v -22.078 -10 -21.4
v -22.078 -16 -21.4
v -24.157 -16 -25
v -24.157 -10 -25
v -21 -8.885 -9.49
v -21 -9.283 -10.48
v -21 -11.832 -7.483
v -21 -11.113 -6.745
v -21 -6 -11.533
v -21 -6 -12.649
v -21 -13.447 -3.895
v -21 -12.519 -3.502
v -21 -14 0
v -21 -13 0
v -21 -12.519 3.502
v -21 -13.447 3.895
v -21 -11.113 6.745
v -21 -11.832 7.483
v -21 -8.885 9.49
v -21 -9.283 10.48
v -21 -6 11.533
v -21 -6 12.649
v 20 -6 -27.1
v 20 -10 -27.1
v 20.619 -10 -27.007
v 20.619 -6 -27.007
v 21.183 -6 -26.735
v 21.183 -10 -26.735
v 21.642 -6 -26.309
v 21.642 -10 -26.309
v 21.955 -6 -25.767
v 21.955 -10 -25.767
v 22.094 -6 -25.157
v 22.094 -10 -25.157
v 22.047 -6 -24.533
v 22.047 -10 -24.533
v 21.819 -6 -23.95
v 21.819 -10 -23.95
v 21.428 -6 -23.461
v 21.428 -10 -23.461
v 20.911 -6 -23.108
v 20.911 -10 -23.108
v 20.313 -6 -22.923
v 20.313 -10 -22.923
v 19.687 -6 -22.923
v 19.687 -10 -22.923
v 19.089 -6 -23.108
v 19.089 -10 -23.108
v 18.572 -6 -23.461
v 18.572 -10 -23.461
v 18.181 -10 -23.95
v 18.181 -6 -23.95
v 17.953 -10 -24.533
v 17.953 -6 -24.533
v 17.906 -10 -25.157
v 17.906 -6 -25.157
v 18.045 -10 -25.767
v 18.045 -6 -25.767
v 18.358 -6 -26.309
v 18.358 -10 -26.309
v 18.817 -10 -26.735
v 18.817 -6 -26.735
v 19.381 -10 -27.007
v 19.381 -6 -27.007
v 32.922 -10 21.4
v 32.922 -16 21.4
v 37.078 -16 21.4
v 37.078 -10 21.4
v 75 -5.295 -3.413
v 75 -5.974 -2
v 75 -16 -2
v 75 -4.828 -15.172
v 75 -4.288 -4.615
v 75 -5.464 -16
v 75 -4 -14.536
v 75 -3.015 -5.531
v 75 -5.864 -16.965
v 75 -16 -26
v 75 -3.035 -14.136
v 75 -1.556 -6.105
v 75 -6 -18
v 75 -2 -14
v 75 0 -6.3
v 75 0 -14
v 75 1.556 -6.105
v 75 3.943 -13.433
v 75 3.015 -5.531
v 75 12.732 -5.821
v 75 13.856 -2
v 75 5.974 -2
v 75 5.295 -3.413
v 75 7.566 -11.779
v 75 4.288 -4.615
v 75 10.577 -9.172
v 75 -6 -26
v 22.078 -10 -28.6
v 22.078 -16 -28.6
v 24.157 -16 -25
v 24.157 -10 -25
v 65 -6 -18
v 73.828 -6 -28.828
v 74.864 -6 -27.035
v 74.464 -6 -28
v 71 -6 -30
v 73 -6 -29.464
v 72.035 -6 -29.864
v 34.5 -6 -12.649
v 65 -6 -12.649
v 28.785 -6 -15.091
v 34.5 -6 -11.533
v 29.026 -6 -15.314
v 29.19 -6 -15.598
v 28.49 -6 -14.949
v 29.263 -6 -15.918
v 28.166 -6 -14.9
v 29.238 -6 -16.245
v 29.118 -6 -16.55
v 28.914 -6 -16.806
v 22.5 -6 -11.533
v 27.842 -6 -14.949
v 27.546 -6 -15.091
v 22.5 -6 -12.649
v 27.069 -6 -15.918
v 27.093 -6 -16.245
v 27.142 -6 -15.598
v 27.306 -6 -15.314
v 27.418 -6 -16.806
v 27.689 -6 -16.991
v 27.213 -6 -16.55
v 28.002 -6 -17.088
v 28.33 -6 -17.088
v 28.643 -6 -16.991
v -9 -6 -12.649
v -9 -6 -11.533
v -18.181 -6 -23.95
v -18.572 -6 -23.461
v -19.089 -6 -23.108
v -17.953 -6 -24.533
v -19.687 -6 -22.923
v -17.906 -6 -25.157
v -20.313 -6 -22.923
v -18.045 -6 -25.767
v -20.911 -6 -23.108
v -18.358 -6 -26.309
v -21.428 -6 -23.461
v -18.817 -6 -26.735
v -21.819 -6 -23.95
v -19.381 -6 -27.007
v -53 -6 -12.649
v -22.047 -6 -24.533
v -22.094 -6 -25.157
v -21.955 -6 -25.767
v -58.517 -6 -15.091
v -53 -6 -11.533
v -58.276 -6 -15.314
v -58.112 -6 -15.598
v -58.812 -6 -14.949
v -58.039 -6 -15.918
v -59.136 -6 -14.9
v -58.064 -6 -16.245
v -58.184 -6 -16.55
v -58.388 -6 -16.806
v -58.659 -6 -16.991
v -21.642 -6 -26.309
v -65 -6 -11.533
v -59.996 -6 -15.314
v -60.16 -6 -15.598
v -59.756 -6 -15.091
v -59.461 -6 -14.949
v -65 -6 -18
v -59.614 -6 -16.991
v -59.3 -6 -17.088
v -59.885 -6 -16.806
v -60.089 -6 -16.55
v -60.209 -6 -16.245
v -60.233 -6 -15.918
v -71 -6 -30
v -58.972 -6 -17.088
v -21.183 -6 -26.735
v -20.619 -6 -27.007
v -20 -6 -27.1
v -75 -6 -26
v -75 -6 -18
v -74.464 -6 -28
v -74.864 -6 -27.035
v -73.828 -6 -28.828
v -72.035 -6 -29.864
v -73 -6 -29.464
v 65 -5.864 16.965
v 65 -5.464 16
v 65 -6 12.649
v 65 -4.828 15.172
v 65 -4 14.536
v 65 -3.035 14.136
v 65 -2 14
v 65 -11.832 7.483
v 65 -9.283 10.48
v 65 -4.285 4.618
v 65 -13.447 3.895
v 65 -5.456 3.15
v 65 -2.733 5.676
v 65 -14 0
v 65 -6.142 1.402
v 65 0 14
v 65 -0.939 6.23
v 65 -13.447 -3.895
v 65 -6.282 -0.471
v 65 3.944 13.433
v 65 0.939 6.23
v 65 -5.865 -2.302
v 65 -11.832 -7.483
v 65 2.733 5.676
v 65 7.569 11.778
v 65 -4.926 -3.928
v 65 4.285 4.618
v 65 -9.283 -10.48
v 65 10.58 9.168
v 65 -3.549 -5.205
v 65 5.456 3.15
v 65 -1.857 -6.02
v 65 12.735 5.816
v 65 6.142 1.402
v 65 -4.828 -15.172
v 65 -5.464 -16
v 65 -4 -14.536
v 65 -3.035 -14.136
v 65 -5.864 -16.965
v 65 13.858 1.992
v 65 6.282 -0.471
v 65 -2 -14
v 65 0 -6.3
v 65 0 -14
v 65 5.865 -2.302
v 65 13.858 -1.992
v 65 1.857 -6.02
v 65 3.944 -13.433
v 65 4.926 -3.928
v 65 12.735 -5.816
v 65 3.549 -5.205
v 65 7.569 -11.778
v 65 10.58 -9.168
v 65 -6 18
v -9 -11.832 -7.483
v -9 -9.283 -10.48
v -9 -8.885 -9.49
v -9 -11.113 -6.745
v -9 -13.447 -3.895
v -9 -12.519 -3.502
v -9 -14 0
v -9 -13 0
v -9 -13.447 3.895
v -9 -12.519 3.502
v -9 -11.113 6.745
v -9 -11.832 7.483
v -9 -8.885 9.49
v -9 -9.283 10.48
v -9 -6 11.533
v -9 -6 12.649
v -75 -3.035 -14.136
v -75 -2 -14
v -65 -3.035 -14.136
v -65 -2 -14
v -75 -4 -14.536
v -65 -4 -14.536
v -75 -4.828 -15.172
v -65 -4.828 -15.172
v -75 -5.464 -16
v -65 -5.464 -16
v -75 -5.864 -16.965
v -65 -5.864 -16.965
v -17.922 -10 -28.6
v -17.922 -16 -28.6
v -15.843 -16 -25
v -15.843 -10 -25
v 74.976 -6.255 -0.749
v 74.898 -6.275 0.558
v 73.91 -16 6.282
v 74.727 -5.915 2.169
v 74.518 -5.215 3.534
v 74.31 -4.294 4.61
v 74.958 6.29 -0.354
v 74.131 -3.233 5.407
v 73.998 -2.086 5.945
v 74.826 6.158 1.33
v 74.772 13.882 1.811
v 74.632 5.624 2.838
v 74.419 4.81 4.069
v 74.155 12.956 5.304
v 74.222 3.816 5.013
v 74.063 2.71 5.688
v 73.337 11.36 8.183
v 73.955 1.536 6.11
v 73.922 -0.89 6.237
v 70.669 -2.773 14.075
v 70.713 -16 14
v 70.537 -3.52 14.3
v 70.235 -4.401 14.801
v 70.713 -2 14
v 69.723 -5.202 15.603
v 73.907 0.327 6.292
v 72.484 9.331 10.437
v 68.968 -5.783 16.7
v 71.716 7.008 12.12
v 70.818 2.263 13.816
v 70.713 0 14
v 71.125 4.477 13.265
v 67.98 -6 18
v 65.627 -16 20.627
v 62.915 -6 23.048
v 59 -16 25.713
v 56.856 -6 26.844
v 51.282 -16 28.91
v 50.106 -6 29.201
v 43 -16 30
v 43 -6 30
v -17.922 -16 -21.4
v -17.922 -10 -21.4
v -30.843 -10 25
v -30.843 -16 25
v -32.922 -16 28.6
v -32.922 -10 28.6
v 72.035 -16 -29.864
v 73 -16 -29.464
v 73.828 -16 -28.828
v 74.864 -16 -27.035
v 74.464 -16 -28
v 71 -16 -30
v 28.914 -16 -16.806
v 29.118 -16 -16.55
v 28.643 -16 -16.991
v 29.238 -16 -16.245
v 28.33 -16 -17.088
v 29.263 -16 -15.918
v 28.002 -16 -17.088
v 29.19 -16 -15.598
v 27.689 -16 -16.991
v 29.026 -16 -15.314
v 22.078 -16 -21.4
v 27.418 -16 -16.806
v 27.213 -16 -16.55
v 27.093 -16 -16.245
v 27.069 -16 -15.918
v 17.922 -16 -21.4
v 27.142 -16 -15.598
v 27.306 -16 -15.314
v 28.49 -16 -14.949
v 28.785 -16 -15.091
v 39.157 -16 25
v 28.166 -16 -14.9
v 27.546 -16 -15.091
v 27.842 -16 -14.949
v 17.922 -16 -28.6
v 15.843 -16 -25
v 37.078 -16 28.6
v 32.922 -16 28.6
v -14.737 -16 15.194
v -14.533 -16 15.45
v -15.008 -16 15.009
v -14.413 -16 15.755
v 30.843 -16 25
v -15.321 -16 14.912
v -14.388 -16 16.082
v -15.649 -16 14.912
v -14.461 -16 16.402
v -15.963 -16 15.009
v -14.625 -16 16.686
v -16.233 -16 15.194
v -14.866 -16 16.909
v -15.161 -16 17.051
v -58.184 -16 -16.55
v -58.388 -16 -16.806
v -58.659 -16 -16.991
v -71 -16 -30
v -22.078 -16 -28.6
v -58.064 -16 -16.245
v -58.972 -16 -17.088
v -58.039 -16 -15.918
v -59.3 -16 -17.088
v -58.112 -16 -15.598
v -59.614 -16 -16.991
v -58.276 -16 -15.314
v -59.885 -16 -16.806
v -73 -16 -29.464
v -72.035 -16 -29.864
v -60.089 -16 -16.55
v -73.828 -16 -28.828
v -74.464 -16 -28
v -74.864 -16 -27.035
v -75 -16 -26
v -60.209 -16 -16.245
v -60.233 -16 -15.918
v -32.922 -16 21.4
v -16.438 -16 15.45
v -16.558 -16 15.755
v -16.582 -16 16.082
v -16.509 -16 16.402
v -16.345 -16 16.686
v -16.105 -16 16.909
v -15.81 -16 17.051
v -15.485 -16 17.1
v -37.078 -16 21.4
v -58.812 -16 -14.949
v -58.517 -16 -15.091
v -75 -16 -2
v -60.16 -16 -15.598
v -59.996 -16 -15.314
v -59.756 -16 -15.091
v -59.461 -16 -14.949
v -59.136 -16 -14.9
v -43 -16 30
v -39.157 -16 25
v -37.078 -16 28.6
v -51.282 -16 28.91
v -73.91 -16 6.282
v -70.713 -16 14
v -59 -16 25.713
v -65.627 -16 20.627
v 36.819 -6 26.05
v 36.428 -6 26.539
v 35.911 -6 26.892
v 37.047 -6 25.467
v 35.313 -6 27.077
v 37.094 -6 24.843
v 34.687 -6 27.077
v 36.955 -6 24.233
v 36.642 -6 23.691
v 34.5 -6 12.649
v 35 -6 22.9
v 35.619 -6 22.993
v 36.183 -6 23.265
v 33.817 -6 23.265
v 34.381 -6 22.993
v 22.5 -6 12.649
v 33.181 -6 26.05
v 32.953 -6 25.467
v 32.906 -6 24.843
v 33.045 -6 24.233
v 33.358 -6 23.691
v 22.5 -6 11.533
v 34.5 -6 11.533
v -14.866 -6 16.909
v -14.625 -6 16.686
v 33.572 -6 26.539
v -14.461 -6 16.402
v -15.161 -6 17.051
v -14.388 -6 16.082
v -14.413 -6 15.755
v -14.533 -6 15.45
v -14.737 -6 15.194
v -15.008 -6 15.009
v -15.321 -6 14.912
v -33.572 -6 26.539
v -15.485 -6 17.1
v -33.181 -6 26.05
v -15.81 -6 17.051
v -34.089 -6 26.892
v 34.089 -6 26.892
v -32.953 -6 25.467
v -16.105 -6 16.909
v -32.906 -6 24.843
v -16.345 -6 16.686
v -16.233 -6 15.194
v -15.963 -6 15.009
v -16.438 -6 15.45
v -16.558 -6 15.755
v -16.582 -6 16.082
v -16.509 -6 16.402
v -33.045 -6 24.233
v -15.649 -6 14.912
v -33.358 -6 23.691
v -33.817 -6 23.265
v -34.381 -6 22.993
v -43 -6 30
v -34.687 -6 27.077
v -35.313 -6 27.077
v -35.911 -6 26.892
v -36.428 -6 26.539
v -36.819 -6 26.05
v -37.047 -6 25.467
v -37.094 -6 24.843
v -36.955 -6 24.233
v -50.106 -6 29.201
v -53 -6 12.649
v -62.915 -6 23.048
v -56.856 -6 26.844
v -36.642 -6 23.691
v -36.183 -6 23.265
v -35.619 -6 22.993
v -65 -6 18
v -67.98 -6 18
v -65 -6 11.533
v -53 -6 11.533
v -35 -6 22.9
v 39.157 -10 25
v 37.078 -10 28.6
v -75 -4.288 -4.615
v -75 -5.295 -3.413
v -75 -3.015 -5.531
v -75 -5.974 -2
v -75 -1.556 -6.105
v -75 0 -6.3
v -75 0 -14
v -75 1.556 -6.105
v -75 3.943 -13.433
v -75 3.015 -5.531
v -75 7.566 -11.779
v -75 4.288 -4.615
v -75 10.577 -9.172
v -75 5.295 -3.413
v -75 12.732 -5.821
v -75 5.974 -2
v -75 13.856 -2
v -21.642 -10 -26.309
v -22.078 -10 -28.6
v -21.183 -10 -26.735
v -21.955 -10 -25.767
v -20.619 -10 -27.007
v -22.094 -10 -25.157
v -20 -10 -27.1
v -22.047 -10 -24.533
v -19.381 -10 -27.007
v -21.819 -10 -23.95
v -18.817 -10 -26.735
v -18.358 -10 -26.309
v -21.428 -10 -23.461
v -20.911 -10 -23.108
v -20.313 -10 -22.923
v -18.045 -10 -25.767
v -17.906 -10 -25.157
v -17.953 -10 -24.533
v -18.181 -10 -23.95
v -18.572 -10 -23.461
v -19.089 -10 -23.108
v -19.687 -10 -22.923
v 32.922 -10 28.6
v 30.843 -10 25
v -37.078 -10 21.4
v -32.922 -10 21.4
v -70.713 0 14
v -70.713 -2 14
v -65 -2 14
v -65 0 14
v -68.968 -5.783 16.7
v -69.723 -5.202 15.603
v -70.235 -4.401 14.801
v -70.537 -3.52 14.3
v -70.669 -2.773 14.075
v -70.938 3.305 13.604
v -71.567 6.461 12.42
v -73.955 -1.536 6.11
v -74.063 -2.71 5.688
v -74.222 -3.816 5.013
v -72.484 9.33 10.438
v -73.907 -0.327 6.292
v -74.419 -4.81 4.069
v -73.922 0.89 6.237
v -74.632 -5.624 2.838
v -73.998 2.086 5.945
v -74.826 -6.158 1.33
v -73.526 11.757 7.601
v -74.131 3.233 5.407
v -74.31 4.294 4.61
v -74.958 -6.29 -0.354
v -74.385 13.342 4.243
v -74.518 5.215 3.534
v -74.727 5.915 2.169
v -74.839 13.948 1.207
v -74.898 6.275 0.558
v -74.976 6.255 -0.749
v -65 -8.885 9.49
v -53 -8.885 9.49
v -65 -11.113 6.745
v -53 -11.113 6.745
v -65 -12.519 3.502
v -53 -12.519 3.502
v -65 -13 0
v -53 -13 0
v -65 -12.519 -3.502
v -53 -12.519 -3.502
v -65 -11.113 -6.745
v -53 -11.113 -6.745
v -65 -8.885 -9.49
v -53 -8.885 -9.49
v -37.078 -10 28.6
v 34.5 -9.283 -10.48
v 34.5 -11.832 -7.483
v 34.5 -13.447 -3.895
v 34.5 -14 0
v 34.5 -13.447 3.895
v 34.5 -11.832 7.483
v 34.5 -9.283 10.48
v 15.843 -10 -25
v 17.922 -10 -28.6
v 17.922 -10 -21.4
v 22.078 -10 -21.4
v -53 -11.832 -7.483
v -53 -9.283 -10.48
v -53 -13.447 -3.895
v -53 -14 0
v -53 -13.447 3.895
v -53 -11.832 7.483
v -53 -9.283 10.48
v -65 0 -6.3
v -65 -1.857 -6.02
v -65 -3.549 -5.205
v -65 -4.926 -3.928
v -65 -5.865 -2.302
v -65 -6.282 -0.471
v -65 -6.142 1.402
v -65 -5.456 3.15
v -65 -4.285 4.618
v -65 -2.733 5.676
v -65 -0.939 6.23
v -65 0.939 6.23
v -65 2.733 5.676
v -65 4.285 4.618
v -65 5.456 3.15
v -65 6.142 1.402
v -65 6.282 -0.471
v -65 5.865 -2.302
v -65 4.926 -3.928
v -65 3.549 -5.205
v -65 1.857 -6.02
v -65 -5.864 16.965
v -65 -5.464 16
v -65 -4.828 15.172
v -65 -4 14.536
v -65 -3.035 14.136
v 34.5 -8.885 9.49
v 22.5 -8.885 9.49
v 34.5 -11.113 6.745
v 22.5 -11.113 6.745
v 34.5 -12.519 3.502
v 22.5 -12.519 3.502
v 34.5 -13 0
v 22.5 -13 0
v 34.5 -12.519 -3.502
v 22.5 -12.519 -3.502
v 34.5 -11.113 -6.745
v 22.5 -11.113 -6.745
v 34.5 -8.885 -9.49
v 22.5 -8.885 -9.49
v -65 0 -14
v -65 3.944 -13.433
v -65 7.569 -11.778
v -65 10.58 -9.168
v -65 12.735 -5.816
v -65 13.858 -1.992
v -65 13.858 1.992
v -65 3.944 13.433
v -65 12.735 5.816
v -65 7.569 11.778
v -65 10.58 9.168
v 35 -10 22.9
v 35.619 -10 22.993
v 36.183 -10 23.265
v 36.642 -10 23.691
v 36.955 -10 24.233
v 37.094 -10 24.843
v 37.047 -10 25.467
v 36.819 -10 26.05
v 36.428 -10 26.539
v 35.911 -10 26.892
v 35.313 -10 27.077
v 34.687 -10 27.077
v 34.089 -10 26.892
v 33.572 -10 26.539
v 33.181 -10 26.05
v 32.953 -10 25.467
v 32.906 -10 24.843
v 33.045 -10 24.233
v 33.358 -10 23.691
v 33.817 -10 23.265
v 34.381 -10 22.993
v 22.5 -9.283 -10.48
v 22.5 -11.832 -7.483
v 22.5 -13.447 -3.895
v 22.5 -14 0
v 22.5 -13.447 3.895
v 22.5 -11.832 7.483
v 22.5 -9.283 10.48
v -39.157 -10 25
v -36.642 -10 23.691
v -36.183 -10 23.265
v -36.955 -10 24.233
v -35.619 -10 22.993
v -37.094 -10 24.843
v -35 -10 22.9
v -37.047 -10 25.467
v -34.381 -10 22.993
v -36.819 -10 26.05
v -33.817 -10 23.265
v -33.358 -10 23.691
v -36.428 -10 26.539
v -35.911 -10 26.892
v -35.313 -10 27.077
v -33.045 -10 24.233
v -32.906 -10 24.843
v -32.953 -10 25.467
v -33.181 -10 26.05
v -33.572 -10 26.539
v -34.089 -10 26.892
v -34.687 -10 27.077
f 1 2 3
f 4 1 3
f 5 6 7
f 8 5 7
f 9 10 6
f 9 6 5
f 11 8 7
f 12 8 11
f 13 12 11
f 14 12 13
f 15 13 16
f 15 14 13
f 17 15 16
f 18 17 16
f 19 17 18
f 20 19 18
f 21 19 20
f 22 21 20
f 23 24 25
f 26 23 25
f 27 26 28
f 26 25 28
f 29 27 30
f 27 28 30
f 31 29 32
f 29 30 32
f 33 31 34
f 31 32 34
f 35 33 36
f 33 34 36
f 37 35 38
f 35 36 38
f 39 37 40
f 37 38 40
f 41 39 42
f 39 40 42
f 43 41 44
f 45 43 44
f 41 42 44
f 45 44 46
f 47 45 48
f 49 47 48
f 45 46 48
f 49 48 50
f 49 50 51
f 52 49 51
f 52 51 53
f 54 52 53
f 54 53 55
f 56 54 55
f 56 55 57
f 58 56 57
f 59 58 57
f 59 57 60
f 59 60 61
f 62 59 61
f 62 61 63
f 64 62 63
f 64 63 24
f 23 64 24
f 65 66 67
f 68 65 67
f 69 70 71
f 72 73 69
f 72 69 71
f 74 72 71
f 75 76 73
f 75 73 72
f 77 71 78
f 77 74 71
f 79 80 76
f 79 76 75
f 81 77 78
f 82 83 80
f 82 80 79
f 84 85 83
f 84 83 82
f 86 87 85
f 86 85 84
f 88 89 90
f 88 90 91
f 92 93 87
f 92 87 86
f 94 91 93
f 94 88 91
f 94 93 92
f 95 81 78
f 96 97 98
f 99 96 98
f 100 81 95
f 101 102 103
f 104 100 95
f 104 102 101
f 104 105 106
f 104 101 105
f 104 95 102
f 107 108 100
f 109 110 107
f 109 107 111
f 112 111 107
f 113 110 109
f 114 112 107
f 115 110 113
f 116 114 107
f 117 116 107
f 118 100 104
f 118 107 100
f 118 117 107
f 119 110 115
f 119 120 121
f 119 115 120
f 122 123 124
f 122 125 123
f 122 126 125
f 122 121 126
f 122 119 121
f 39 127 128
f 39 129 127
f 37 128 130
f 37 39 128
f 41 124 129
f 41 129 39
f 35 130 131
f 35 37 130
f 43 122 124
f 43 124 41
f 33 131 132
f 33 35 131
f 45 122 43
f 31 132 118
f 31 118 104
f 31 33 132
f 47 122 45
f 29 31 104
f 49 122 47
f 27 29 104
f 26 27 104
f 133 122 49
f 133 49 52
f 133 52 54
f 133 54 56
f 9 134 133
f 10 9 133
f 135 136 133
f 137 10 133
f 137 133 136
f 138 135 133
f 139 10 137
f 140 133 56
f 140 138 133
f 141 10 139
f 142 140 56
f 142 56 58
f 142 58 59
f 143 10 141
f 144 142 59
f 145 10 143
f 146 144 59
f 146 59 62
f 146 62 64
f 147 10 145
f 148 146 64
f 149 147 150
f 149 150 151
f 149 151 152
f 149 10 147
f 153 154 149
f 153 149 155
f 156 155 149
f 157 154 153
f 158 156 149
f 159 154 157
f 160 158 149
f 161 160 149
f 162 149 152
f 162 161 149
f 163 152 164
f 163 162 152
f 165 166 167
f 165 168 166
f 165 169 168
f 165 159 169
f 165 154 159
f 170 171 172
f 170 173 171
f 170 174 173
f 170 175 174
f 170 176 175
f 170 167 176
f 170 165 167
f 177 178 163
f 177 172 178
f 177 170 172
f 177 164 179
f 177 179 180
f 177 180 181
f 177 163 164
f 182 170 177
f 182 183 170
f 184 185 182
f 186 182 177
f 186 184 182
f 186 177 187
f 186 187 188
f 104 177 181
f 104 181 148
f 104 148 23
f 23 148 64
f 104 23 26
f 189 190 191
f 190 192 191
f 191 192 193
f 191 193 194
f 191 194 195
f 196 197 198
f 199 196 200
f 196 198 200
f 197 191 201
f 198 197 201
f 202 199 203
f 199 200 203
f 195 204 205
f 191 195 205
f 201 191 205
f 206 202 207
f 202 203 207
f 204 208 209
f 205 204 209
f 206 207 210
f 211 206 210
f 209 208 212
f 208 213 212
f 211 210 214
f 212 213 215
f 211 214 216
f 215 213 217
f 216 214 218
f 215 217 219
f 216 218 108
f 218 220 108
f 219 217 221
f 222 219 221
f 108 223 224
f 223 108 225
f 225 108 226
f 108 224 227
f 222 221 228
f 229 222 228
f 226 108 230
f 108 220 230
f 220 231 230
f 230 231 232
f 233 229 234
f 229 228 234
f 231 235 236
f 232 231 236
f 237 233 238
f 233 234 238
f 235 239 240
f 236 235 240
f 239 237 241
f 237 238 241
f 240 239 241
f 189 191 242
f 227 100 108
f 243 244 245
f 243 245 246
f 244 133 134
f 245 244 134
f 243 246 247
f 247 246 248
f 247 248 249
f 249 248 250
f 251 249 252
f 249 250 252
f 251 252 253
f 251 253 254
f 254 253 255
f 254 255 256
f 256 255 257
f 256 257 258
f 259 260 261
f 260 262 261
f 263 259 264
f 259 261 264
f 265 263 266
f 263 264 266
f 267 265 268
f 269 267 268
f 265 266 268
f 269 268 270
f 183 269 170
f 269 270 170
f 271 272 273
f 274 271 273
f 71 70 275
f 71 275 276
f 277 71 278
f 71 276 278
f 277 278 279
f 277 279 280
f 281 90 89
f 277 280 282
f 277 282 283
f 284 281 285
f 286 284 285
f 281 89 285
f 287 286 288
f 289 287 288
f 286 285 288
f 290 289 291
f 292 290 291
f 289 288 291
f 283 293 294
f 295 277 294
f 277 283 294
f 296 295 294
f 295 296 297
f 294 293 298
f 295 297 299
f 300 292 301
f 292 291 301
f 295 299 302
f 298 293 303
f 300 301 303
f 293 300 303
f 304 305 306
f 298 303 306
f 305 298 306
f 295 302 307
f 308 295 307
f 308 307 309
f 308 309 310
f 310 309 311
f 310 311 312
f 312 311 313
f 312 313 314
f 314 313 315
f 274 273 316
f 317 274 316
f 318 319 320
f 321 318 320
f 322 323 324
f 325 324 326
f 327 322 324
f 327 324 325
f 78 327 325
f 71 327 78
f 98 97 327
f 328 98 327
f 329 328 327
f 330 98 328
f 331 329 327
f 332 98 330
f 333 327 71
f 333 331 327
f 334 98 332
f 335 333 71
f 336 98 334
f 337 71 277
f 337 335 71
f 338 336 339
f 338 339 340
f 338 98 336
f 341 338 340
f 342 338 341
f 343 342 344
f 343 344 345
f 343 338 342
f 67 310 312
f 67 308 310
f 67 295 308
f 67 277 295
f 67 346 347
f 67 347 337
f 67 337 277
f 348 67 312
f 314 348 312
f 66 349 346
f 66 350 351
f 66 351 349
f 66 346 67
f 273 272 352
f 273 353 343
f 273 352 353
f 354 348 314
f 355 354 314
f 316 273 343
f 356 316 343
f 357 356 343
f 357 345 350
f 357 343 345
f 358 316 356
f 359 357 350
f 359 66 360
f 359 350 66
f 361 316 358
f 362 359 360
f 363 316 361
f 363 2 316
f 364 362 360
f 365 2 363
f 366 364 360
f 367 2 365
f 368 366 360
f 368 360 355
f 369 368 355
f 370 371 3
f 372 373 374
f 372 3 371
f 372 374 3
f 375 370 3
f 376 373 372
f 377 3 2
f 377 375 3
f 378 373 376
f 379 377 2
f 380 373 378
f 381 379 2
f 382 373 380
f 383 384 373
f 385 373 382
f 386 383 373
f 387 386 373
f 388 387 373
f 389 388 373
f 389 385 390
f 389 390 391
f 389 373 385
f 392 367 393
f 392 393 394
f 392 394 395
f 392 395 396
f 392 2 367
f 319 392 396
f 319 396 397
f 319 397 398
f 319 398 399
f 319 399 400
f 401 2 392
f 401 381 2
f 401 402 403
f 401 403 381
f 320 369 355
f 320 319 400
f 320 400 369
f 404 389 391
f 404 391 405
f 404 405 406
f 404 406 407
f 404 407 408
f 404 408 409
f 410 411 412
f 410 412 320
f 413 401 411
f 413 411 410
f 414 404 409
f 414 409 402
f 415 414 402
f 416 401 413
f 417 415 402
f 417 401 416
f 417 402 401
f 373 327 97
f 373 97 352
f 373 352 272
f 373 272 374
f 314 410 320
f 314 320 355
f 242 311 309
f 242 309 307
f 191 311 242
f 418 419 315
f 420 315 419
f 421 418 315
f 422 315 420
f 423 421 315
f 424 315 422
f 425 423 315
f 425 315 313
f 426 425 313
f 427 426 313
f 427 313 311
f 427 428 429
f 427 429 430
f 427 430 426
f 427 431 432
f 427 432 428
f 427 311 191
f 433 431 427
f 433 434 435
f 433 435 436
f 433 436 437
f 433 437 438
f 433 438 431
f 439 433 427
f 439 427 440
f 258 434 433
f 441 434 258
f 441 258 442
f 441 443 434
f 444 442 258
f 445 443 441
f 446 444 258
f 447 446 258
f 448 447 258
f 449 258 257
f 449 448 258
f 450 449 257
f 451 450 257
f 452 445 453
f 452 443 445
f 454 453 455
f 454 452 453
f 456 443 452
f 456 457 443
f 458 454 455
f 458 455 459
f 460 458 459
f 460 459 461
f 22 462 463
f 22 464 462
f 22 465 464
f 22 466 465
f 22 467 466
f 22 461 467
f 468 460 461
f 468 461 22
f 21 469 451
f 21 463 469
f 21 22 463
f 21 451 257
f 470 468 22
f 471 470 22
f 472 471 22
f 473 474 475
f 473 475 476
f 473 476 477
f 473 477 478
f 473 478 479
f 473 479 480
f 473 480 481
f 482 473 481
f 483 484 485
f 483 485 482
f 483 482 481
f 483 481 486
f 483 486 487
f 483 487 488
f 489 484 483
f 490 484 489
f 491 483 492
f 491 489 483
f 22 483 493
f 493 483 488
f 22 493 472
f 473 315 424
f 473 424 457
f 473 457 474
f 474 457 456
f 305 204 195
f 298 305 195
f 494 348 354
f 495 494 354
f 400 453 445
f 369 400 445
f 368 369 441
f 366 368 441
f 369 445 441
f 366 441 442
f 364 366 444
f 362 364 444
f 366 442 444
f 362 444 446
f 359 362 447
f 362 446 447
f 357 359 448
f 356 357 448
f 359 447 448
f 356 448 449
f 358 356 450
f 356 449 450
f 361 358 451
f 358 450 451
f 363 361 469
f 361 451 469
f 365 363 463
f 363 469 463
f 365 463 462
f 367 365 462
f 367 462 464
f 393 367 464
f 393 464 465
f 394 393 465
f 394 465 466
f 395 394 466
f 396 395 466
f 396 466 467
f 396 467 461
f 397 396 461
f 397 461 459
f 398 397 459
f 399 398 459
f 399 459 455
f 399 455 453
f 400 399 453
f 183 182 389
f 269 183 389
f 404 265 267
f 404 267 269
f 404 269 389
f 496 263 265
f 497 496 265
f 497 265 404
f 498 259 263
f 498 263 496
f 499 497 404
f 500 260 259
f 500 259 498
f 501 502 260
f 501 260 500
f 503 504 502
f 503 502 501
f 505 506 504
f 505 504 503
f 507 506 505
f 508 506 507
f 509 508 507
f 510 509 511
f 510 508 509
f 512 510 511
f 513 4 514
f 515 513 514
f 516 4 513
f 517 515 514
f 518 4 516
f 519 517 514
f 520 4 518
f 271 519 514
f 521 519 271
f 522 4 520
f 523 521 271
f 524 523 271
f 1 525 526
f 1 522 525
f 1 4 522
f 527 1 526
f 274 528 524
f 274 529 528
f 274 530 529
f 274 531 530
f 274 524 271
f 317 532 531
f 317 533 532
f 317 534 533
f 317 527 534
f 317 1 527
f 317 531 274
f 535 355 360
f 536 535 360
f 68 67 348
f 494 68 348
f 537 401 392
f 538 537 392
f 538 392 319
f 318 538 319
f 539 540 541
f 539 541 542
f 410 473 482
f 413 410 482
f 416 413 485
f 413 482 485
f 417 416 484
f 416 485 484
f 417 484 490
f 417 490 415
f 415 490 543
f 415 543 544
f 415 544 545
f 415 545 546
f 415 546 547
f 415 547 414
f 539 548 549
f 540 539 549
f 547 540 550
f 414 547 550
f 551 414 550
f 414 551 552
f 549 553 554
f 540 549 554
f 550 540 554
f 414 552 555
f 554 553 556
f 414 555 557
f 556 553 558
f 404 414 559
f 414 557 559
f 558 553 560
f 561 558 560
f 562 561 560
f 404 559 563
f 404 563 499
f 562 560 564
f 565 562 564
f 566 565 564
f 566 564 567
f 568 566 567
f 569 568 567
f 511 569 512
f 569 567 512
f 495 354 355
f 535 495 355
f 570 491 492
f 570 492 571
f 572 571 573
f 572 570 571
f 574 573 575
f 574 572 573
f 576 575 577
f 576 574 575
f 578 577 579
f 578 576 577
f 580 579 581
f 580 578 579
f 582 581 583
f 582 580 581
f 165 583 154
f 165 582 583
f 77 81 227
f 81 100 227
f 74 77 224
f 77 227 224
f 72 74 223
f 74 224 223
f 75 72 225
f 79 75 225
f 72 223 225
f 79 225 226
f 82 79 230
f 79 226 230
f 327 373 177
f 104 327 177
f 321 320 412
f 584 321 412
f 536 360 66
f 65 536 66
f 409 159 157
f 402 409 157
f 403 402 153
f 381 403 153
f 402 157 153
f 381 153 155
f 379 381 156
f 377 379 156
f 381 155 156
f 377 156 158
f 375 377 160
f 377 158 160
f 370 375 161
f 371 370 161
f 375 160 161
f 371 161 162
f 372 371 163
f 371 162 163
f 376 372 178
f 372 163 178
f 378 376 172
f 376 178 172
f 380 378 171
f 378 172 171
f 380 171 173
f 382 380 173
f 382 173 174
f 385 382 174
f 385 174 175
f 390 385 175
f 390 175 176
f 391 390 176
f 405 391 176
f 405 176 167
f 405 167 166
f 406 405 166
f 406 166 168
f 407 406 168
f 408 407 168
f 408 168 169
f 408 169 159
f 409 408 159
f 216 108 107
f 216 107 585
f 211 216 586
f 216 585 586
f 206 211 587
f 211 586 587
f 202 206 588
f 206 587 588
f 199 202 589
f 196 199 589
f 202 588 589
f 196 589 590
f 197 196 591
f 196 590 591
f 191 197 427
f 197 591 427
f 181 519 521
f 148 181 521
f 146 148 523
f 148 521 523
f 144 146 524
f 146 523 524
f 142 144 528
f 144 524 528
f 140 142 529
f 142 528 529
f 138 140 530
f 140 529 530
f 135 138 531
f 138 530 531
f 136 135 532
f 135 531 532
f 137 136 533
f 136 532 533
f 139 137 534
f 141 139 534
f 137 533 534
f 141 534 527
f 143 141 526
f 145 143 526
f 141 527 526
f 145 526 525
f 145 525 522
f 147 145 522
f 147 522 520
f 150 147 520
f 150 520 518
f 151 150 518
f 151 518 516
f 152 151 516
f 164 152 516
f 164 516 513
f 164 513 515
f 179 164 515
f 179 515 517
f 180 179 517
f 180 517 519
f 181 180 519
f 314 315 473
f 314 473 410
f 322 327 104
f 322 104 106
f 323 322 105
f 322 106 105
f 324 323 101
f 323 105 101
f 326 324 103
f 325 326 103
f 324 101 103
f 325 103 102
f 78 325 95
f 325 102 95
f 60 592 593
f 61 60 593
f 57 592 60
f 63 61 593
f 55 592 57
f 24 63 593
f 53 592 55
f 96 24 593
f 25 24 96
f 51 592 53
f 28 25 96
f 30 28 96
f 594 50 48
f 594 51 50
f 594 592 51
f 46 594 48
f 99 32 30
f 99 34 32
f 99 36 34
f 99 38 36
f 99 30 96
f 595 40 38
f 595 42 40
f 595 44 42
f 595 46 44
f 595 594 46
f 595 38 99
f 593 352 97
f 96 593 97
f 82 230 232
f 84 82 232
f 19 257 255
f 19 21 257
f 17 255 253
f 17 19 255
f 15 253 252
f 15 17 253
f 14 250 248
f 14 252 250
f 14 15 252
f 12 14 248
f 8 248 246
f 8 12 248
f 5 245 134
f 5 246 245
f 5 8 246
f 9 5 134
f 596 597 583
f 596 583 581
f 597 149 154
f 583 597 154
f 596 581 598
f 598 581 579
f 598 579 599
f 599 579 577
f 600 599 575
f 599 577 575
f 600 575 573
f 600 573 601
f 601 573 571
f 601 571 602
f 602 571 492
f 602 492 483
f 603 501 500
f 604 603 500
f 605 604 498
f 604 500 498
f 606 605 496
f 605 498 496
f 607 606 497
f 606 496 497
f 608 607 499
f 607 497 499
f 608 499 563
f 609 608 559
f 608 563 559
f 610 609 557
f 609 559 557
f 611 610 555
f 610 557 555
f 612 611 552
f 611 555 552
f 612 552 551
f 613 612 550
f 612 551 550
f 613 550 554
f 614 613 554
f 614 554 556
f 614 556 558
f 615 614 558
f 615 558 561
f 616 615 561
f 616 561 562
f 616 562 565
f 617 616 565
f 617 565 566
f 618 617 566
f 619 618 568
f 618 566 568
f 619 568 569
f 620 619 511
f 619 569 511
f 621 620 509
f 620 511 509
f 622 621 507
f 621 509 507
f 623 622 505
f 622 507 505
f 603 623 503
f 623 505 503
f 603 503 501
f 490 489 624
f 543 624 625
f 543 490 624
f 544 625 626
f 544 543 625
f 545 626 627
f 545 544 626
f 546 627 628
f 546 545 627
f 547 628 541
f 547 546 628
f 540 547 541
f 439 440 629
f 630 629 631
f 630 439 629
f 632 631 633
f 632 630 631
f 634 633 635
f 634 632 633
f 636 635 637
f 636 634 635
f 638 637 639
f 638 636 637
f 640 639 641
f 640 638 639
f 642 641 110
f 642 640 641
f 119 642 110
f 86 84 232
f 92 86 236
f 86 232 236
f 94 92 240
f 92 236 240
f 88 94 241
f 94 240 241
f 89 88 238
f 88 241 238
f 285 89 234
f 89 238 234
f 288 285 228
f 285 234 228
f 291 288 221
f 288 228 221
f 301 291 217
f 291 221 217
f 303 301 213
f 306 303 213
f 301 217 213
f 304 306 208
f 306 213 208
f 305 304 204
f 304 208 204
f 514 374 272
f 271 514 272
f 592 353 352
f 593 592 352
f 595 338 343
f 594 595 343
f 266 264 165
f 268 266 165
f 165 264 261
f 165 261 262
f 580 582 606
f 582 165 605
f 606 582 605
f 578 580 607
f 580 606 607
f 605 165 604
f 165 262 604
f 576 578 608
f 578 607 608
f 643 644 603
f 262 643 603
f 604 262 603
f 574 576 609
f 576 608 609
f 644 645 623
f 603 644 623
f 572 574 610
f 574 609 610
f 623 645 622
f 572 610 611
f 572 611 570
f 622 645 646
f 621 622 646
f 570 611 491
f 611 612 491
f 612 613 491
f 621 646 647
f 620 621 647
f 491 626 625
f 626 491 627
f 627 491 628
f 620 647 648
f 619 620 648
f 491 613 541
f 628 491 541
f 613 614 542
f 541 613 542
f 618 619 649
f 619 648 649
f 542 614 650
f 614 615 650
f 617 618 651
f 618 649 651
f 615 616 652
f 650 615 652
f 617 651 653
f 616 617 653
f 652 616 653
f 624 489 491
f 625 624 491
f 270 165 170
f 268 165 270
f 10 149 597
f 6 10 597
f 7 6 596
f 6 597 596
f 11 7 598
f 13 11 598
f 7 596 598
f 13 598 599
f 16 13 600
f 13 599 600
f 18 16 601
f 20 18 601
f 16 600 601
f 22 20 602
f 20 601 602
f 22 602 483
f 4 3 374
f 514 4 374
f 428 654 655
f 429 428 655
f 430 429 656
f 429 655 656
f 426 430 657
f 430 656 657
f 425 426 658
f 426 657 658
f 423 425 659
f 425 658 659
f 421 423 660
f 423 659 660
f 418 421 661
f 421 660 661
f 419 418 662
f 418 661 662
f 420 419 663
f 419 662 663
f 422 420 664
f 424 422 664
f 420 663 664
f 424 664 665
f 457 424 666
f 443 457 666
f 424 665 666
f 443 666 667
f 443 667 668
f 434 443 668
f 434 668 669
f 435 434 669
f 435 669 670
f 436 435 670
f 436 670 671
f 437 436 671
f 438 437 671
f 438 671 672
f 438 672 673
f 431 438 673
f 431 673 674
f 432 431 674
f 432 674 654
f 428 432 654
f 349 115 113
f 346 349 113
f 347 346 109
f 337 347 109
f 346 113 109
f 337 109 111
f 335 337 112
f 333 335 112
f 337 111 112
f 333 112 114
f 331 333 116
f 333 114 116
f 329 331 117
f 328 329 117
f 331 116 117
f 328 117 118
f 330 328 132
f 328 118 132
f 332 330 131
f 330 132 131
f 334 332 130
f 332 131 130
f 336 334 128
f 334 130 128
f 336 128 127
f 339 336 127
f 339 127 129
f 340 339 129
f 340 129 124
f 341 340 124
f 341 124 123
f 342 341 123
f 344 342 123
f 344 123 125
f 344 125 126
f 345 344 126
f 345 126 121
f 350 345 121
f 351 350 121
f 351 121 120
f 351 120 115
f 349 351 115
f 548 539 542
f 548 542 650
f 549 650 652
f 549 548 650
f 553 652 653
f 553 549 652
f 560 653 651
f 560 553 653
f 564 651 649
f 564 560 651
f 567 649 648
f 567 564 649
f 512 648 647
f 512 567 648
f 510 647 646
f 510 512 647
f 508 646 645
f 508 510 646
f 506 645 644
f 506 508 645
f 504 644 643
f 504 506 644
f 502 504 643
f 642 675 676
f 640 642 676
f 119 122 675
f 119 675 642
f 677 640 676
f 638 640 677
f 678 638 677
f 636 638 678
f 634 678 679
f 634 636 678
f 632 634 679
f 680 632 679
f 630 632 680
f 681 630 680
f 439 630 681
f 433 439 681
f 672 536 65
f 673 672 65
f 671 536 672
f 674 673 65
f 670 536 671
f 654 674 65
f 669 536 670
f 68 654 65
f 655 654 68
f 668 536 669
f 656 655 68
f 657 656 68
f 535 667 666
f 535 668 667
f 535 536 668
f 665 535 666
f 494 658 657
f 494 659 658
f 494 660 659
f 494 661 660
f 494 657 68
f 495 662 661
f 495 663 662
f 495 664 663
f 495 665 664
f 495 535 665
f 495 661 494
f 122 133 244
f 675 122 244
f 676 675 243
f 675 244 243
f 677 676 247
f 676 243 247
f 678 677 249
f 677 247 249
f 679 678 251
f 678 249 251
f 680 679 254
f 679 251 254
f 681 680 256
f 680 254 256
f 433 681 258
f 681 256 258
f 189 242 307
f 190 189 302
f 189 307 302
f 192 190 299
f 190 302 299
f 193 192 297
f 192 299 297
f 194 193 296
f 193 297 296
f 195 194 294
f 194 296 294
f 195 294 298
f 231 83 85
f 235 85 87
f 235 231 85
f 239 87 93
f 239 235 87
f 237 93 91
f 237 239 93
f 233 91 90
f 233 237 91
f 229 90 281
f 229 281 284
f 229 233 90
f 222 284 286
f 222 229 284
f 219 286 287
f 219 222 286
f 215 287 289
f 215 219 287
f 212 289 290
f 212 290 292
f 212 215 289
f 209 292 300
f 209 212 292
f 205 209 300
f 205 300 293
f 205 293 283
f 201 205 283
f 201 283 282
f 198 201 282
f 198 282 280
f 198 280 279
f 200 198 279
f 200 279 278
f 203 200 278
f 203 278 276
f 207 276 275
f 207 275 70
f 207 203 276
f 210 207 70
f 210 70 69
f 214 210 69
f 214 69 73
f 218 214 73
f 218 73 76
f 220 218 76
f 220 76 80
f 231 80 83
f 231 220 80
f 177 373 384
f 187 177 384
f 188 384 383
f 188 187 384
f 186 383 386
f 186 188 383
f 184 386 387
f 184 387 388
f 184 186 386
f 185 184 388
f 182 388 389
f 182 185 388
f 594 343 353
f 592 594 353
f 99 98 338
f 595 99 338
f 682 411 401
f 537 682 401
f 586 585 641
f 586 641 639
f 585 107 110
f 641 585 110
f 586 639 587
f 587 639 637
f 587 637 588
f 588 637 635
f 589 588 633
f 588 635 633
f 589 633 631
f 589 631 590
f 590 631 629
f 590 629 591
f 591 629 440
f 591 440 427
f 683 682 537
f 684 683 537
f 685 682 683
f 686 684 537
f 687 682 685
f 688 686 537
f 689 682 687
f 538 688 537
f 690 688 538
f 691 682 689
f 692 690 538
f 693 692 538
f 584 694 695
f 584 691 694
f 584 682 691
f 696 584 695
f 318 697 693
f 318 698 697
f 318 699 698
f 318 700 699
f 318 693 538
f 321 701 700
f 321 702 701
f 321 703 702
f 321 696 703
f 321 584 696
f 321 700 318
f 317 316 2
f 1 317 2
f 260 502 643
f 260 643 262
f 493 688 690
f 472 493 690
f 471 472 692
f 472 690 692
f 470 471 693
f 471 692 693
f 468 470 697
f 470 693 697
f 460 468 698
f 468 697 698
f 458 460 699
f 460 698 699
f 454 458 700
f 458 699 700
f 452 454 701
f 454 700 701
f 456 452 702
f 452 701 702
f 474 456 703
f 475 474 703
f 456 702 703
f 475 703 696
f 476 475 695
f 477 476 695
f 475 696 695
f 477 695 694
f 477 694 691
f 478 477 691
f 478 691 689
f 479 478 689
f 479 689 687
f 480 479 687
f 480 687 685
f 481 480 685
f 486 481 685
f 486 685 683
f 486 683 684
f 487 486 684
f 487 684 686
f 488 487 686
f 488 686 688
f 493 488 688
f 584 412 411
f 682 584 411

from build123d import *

# Parameters (mm, degrees)
BOSS_EXTRUDE1_DEPTH      = 75
BOSS_EXTRUDE1_DEPTH_BACK = 75
BOSS_EXTRUDE2_START      = -10
SKETCH2_R                = 6.3
BOSS_EXTRUDE2_DEPTH      = 10
SKETCH3_R                = 6.3
BOSS_EXTRUDE3_DEPTH      = 10
SKETCH4_R                = 1.1
CUT_EXTRUDE1_DEPTH       = 84.216584885
SKETCH5_R                = 2.1
CUT_EXTRUDE2_DEPTH       = 87.168439698
CUT_EXTRUDE3_DEPTH       = 6
FILLET1_R                = 4
FILLET2_R                = 4
FILLET3_R                = 32
BOSS_EXTRUDE4_DEPTH      = 12
BOSS_EXTRUDE5_START      = -43.5
BOSS_EXTRUDE5_DEPTH      = 12
BOSS_EXTRUDE7_START      = 44
BOSS_EXTRUDE7_DEPTH      = 12
SKETCH16_R               = 13
CUT_EXTRUDE8_DEPTH       = 99.5


with BuildPart() as part:
    # Sketch1 → Boss-Extrude1 (new, two sides: drawn at the far end of the back side and taken through both)
    with BuildSketch(Plane(origin=(0, 0, 0), x_dir=(0, 0, -1), z_dir=(1, 0, 0)).offset(-BOSS_EXTRUDE1_DEPTH_BACK)):
        with BuildLine():
            Line((-12.649110641, -6), (-30, -6))
            Line((-30, -6), (-30, -16))
            Line((-30, -16), (30, -16))
            Line((30, -16), (30, -6))
            Line((30, -6), (12.649110641, -6))
            ThreePointArc((12.649110641, -6), (0, -14), (-12.649110641, -6))
        make_face()
    extrude(amount=BOSS_EXTRUDE1_DEPTH + BOSS_EXTRUDE1_DEPTH_BACK)

    # Sketch2 → Boss-Extrude2 (add)
    with BuildSketch(Plane(origin=(75, 0, 0), x_dir=(0, 0, -1), z_dir=(1, 0, 0)).offset(BOSS_EXTRUDE2_START)):
        with BuildLine():
            Line((-14, 0), (-14, -16))
            Line((-14, -16), (14, -16))
            Line((14, -16), (14, 0))
            ThreePointArc((14, 0), (0, 14), (-14, 0))
        make_face()
        Circle(SKETCH2_R, mode=Mode.SUBTRACT)
    extrude(amount=BOSS_EXTRUDE2_DEPTH)

    # Sketch3 → Boss-Extrude3 (add)
    with BuildSketch(Plane.ZY.offset(75)):
        with BuildLine():
            Line((-14, 0), (-14, -16))
            Line((-14, -16), (14, -16))
            Line((14, -16), (14, 0))
            ThreePointArc((14, 0), (0, 14), (-14, 0))
        make_face()
        with Locations(Location((0, 0, 0), (0, 0, 180))):
            Circle(SKETCH3_R, mode=Mode.SUBTRACT)
    extrude(amount=-BOSS_EXTRUDE3_DEPTH)

    # Sketch4 → Cut-Extrude1 (cut, through all)
    with BuildSketch(Plane(origin=(0, -6, 0), x_dir=(1, 0, 0), z_dir=(0, 1, 0))):
        with Locations(Location((-15.4853, -16, 0), (0, 0, 270))):
            Circle(SKETCH4_R)
        with Locations(Location((-59.1364, 16, 0), (0, 0, 270))):
            Circle(SKETCH4_R)
        with Locations(Location((28.1658, 16, 0), (0, 0, 270))):
            Circle(SKETCH4_R)
    extrude(amount=-CUT_EXTRUDE1_DEPTH, mode=Mode.SUBTRACT)

    # Sketch5 → Cut-Extrude2 (cut, through all)
    with BuildSketch(Plane.XZ.offset(16)):
        with Locations(Location((-35, 25, 0), (0, 0, 270))):
            Circle(SKETCH5_R)
        with Locations(Location((35, 25, 0), (0, 0, 270))):
            Circle(SKETCH5_R)
        with Locations(Location((-20, -25, 0), (0, 0, 270))):
            Circle(SKETCH5_R)
        with Locations(Location((20, -25, 0), (0, 0, 270))):
            Circle(SKETCH5_R)
    extrude(amount=-CUT_EXTRUDE2_DEPTH, mode=Mode.SUBTRACT)

    # Sketch7 → Cut-Extrude3 (cut)
    with BuildSketch(Plane.XZ.offset(16)):
        Polygon((-37.078460969, 28.6), (-39.156921938, 25), (-37.078460969, 21.4), (-32.921539031, 21.4), (-30.843078062, 25), (-32.921539031, 28.6), align=None)
        Polygon((32.921539031, 28.6), (30.843078062, 25), (32.921539031, 21.4), (37.078460969, 21.4), (39.156921938, 25), (37.078460969, 28.6), align=None)
        Polygon((-22.078460969, -21.4), (-24.156921938, -25), (-22.078460969, -28.6), (-17.921539031, -28.6), (-15.843078062, -25), (-17.921539031, -21.4), align=None)
        Polygon((17.921539031, -21.4), (15.843078062, -25), (17.921539031, -28.6), (22.078460969, -28.6), (24.156921938, -25), (22.078460969, -21.4), align=None)
    extrude(amount=-CUT_EXTRUDE3_DEPTH, mode=Mode.SUBTRACT)

    # Fillet1
    fillet1_edges = [part.edges().sort_by_distance(p)[0] for p in [
        (70, -6, -14),
        (70, -6, 14),
        (-70, -6, 14),
        (-70, -6, -14),
    ]]
    fillet(fillet1_edges, radius=FILLET1_R)

    # Fillet2
    fillet2_edges = [part.edges().sort_by_distance(p)[0] for p in [
        (-75, -11, -30),
        (75, -11, -30),
    ]]
    fillet(fillet2_edges, radius=FILLET2_R)

    # Fillet3
    # the kernel refuses this fillet: 32 mm, written as the material it takes off along each edge
    with BuildSketch(Plane(origin=(75, 74, 30), x_dir=(0, 0, -1), z_dir=(0, -1, 0)), Plane(origin=(-75, 74, 30), x_dir=(1, 0, 0), z_dir=(0, -1, 0))) as fillet3_piece_1:
        with BuildLine():
            CenterArc((FILLET3_R, -FILLET3_R), FILLET3_R, 90, 90)
            Line((0, -FILLET3_R), (0, 0))
            Line((0, 0), (FILLET3_R, 0))
        make_face()
    extrude(amount=170, mode=Mode.SUBTRACT)

    # Sketch8 → Boss-Extrude4 (add)
    with BuildSketch(Plane.ZY.offset(21)):
        with BuildLine():
            Line((-10.9658561, -6), (-13.747727085, -6))
            ThreePointArc((-13.747727085, -6), (0, -15), (13.747727085, -6))
            Line((13.747727085, -6), (10.9658561, -6))
            ThreePointArc((10.9658561, -6), (0, -12.5), (-10.9658561, -6))
        make_face()
    extrude(amount=-BOSS_EXTRUDE4_DEPTH)

    # Sketch8<2> → Boss-Extrude5 (add)
    with BuildSketch(Plane.ZY.offset(21).offset(BOSS_EXTRUDE5_START)):
        with BuildLine():
            Line((-10.9658561, -6), (-13.747727085, -6))
            ThreePointArc((-13.747727085, -6), (0, -15), (13.747727085, -6))
            Line((13.747727085, -6), (10.9658561, -6))
            ThreePointArc((10.9658561, -6), (0, -12.5), (-10.9658561, -6))
        make_face()
    extrude(amount=-BOSS_EXTRUDE5_DEPTH)

    # Sketch8<4> → Boss-Extrude7 (add)
    with BuildSketch(Plane.ZY.offset(21).offset(BOSS_EXTRUDE7_START)):
        with BuildLine():
            Line((-10.9658561, -6), (-13.747727085, -6))
            ThreePointArc((-13.747727085, -6), (0, -15), (13.747727085, -6))
            Line((13.747727085, -6), (10.9658561, -6))
            ThreePointArc((10.9658561, -6), (0, -12.5), (-10.9658561, -6))
        make_face()
    extrude(amount=-BOSS_EXTRUDE7_DEPTH)

    # Sketch16 → Cut-Extrude8 (cut)
    with BuildSketch(Plane(origin=(-65, 0, 0), x_dir=(0, 0, -1), z_dir=(1, 0, 0))):
        Circle(SKETCH16_R)
    extrude(amount=CUT_EXTRUDE8_DEPTH, mode=Mode.SUBTRACT)


solid = part.part
